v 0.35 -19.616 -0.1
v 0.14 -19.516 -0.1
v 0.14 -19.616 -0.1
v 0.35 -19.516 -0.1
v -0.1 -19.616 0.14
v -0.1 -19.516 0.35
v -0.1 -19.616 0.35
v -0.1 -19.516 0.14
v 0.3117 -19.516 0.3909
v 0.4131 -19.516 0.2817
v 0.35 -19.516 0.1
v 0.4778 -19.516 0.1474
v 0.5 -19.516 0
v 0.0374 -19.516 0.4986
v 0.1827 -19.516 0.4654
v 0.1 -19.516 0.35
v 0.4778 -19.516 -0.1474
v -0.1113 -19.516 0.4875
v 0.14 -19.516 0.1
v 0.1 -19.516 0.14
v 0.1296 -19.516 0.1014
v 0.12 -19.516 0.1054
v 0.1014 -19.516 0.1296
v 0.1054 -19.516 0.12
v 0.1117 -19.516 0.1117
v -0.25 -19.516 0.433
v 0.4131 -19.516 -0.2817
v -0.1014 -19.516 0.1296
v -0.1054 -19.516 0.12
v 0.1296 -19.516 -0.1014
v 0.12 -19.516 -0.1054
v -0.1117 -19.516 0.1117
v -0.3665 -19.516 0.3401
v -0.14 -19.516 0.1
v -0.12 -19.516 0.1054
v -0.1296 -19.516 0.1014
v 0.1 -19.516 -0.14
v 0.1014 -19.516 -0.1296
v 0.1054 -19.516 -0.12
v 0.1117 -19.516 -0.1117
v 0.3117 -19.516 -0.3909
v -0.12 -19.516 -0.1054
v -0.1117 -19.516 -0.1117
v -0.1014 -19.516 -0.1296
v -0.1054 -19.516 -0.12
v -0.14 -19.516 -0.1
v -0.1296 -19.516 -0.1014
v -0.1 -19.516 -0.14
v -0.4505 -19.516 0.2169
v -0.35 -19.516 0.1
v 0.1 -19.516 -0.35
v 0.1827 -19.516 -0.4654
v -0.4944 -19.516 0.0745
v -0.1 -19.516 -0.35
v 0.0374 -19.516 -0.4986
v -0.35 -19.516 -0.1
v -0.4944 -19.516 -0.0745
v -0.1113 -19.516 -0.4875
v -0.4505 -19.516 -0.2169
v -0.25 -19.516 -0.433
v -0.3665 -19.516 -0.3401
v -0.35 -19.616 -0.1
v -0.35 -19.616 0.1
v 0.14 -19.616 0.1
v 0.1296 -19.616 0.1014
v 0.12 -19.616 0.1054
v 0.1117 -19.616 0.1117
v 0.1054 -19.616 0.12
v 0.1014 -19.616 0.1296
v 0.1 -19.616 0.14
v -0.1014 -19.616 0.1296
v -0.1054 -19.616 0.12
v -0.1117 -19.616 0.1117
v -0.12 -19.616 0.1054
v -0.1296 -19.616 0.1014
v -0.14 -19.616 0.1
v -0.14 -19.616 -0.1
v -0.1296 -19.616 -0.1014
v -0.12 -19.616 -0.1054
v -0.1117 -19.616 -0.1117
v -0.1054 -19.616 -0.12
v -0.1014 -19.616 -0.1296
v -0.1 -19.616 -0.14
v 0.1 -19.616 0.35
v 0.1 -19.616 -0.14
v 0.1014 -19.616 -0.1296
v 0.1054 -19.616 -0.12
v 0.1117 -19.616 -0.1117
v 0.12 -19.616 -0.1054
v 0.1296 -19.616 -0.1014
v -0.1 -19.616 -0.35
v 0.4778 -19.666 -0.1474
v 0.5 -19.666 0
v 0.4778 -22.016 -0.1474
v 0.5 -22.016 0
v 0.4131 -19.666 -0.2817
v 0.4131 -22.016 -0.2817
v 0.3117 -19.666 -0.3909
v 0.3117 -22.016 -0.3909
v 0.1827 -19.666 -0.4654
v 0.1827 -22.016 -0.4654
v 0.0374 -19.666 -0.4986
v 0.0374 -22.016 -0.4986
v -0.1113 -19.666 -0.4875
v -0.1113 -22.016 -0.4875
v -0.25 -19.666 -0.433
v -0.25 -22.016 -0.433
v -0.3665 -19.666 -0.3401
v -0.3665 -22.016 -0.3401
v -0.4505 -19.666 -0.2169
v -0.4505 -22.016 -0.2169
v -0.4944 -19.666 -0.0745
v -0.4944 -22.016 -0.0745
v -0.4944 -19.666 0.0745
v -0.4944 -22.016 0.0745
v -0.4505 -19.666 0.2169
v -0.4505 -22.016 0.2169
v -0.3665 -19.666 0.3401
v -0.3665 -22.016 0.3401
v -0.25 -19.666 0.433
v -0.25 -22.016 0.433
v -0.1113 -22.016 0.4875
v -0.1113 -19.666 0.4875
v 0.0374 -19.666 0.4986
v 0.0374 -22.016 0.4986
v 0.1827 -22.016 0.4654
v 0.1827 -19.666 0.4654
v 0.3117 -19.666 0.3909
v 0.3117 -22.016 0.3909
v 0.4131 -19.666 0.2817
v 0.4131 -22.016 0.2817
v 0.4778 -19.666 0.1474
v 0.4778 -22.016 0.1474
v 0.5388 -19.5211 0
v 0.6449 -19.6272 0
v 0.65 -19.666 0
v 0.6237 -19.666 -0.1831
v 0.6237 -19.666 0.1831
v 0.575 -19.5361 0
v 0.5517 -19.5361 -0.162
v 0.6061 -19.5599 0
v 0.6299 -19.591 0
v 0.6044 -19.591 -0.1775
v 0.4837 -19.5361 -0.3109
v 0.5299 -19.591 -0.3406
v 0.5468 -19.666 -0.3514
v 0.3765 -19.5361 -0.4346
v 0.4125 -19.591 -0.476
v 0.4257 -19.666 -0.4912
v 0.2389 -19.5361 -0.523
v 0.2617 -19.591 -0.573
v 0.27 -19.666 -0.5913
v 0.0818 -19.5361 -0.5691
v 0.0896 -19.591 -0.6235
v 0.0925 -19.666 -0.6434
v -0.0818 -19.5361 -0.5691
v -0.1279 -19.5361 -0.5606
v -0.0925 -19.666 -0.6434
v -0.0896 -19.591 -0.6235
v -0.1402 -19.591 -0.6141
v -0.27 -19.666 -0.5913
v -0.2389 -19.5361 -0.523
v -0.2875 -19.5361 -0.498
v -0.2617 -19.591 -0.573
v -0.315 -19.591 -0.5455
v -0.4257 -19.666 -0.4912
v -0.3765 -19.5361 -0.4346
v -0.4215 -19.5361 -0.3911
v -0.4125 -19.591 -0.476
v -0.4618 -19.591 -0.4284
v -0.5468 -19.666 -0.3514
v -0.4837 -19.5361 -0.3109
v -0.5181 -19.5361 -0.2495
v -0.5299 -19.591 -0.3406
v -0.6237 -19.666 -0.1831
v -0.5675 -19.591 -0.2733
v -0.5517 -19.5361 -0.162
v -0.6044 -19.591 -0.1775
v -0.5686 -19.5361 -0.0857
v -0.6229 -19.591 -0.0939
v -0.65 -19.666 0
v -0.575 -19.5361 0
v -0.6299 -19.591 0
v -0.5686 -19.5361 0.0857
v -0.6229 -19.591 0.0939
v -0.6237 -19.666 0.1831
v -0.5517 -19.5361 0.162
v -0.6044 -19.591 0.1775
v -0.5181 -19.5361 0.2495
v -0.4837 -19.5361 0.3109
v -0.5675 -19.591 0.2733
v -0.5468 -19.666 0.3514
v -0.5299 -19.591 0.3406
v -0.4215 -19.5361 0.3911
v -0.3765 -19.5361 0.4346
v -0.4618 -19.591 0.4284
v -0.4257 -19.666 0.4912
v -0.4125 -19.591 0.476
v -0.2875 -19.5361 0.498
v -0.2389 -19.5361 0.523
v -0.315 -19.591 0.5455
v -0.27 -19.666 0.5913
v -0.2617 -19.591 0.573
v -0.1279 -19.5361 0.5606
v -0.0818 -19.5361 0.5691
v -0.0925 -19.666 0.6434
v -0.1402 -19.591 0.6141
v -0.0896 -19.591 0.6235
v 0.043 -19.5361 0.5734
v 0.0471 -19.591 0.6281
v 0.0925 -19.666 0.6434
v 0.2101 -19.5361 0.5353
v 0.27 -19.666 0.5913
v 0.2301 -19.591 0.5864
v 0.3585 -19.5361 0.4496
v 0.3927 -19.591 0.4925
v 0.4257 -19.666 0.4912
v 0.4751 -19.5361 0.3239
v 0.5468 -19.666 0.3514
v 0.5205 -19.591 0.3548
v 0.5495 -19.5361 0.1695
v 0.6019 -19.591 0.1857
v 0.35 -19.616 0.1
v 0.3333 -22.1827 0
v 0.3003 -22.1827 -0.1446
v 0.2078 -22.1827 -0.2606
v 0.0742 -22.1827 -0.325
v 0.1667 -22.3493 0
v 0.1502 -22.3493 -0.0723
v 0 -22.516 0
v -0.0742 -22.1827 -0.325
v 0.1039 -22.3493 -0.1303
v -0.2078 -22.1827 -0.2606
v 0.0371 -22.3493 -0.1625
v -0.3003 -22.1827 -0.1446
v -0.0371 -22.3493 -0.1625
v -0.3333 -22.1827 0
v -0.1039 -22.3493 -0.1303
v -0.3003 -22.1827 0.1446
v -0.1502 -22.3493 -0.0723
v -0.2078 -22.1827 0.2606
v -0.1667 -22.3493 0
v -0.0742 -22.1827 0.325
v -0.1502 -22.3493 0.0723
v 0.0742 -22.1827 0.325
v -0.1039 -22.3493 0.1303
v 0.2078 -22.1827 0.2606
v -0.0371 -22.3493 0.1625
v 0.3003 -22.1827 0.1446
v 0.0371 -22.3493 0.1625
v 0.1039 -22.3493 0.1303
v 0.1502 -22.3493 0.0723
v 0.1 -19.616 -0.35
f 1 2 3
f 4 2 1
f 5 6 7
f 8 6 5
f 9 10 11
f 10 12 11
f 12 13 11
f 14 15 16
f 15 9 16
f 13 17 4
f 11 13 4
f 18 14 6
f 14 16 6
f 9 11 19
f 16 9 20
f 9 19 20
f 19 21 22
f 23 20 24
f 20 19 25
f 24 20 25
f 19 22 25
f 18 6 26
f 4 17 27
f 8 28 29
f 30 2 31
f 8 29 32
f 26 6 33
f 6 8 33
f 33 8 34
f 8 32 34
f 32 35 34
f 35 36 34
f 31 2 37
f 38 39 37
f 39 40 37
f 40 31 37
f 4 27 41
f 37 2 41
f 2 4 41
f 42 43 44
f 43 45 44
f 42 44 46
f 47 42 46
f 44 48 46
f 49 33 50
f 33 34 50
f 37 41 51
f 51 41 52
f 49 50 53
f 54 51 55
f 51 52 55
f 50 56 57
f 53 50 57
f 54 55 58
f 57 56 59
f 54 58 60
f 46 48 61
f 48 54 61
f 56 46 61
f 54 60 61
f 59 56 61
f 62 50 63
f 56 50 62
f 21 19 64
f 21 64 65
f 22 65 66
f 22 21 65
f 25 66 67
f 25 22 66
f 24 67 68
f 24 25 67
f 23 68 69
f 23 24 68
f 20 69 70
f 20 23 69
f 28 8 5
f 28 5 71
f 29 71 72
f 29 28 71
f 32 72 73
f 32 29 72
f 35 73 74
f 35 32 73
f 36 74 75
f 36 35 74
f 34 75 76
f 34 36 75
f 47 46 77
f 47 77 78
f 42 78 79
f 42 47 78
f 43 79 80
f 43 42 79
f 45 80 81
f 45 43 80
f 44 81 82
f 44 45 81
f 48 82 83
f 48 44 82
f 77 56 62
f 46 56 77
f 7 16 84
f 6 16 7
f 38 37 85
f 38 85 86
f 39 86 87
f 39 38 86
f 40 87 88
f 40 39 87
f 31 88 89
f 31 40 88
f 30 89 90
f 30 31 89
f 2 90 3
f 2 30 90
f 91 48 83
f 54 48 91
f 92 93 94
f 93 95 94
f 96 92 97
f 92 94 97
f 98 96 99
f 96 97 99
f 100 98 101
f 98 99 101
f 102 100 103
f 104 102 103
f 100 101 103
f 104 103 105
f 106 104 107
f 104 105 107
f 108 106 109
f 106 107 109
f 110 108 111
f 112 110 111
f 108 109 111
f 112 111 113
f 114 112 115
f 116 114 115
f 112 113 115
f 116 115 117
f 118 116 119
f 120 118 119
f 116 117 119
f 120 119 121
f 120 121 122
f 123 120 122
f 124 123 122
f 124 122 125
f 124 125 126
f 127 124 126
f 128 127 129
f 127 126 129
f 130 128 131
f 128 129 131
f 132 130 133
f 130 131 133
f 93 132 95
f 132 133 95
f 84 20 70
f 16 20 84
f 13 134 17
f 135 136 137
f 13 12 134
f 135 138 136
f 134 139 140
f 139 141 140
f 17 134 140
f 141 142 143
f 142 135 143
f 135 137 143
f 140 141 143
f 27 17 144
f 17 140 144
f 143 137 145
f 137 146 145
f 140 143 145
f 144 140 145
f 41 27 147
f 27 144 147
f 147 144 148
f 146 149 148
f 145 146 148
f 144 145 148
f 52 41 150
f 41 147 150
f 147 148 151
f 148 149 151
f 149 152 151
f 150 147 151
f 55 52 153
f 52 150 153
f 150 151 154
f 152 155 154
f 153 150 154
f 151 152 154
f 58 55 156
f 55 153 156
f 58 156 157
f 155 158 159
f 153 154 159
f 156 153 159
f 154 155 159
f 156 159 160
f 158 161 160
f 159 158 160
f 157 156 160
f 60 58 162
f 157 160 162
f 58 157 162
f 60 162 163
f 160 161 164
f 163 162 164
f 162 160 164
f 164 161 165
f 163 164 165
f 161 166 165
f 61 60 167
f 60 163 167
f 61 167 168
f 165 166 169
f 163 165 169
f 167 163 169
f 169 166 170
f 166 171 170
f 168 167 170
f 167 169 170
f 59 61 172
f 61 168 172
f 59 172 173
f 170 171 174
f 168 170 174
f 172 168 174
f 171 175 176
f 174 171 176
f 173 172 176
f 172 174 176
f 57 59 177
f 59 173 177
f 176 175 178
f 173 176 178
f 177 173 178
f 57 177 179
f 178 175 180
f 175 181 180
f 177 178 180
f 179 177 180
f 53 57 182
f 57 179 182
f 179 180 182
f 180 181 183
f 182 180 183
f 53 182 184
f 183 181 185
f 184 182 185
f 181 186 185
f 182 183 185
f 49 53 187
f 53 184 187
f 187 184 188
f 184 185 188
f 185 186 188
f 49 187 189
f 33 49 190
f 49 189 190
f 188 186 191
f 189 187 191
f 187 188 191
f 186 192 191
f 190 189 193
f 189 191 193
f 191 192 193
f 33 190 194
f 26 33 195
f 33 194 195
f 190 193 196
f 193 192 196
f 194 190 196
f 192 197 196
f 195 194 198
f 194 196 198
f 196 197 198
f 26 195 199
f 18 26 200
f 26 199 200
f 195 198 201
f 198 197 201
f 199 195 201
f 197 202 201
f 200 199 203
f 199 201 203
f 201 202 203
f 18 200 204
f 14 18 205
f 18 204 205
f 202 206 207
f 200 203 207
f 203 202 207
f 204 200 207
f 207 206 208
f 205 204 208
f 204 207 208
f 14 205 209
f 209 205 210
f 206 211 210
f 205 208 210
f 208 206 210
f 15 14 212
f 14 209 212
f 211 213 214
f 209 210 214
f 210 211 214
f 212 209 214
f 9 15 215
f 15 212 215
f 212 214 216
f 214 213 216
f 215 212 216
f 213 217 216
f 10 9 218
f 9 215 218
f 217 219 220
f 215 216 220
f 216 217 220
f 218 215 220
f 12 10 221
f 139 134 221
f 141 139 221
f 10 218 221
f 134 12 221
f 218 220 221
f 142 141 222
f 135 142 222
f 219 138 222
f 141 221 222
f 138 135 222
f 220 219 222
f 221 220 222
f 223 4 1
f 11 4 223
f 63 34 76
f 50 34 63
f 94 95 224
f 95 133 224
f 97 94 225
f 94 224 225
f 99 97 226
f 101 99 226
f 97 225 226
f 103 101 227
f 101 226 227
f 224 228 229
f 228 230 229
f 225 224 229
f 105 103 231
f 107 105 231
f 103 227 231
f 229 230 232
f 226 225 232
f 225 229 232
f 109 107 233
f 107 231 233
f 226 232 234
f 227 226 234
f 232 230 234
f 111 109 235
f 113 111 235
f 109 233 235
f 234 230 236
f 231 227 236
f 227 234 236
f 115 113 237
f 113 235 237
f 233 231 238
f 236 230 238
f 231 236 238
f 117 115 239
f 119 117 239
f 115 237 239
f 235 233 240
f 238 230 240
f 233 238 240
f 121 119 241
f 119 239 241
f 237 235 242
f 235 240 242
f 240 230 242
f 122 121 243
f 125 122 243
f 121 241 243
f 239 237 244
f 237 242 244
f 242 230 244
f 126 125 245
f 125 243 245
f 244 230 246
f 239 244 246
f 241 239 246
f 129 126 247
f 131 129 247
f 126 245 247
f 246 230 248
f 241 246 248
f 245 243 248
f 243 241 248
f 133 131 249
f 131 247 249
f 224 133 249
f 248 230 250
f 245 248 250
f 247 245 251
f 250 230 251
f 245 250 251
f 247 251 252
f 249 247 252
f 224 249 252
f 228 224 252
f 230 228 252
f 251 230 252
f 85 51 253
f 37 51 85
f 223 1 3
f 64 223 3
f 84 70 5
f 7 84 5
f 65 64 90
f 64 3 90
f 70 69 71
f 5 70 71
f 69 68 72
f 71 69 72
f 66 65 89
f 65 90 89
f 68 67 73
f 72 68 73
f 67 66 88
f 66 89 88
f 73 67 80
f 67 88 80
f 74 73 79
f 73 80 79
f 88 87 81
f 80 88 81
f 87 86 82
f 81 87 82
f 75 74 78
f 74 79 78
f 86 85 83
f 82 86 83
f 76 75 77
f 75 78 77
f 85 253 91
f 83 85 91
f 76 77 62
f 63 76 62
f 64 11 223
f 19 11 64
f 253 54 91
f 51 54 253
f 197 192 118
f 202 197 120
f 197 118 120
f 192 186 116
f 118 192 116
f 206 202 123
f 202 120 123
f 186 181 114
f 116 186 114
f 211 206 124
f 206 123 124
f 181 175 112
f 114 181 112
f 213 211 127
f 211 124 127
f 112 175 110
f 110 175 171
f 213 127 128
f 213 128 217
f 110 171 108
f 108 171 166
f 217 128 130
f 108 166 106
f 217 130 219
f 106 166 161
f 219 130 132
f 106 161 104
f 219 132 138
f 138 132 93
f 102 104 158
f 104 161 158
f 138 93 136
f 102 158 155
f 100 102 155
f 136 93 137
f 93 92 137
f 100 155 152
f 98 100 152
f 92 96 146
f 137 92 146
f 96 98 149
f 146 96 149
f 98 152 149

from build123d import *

# Parameters (mm, degrees)
CUT_EXTRUDE1_DEPTH = 0.1


with BuildPart() as part:
    # Sketch1 → Revolve1 (revolve)
    with BuildSketch(Plane.XY):
        with BuildLine():
            Line((0, -19.516007696), (0.5, -19.516007696))
            ThreePointArc((0.5, -19.516007696), (0.606066017, -19.559941679), (0.65, -19.666007696))
            Line((0.65, -19.666007696), (0.5, -19.666007696))
            Line((0.5, -19.666007696), (0.5, -19.816007696))
            Line((0.5, -19.816007696), (0.5, -22.016007696))
            Line((0.5, -22.016007696), (0, -22.516007696))
            Line((0, -22.516007696), (0, -19.516007696))
        make_face()
    revolve(axis=Axis((0, -22.516007696, 0), (0, 1, 0)))

    # Sketch2 → Cut-Extrude1 (cut)
    with BuildSketch(Plane(origin=(0, -19.516007696, 0), x_dir=(1, 0, 0), z_dir=(0, 1, 0))):
        with BuildLine():
            Line((-0.1, 0.35), (0.1, 0.35))
            Line((0.1, 0.35), (0.1, 0.14))
            ThreePointArc((0.1, 0.14), (0.111715729, 0.111715729), (0.14, 0.1))
            Line((0.14, 0.1), (0.35, 0.1))
            Line((0.35, 0.1), (0.35, -0.1))
            Line((0.35, -0.1), (0.14, -0.1))
            ThreePointArc((0.14, -0.1), (0.111715729, -0.111715729), (0.1, -0.14))
            Line((0.1, -0.14), (0.1, -0.35))
            Line((0.1, -0.35), (-0.1, -0.35))
            Line((-0.1, -0.35), (-0.1, -0.14))
            ThreePointArc((-0.1, -0.14), (-0.111715729, -0.111715729), (-0.14, -0.1))
            Line((-0.14, -0.1), (-0.35, -0.1))
            Line((-0.35, -0.1), (-0.35, 0.1))
            Line((-0.35, 0.1), (-0.14, 0.1))
            ThreePointArc((-0.14, 0.1), (-0.111715729, 0.111715729), (-0.1, 0.14))
            Line((-0.1, 0.14), (-0.1, 0.35))
        make_face()
    extrude(amount=-CUT_EXTRUDE1_DEPTH, mode=Mode.SUBTRACT)


solid = part.part
